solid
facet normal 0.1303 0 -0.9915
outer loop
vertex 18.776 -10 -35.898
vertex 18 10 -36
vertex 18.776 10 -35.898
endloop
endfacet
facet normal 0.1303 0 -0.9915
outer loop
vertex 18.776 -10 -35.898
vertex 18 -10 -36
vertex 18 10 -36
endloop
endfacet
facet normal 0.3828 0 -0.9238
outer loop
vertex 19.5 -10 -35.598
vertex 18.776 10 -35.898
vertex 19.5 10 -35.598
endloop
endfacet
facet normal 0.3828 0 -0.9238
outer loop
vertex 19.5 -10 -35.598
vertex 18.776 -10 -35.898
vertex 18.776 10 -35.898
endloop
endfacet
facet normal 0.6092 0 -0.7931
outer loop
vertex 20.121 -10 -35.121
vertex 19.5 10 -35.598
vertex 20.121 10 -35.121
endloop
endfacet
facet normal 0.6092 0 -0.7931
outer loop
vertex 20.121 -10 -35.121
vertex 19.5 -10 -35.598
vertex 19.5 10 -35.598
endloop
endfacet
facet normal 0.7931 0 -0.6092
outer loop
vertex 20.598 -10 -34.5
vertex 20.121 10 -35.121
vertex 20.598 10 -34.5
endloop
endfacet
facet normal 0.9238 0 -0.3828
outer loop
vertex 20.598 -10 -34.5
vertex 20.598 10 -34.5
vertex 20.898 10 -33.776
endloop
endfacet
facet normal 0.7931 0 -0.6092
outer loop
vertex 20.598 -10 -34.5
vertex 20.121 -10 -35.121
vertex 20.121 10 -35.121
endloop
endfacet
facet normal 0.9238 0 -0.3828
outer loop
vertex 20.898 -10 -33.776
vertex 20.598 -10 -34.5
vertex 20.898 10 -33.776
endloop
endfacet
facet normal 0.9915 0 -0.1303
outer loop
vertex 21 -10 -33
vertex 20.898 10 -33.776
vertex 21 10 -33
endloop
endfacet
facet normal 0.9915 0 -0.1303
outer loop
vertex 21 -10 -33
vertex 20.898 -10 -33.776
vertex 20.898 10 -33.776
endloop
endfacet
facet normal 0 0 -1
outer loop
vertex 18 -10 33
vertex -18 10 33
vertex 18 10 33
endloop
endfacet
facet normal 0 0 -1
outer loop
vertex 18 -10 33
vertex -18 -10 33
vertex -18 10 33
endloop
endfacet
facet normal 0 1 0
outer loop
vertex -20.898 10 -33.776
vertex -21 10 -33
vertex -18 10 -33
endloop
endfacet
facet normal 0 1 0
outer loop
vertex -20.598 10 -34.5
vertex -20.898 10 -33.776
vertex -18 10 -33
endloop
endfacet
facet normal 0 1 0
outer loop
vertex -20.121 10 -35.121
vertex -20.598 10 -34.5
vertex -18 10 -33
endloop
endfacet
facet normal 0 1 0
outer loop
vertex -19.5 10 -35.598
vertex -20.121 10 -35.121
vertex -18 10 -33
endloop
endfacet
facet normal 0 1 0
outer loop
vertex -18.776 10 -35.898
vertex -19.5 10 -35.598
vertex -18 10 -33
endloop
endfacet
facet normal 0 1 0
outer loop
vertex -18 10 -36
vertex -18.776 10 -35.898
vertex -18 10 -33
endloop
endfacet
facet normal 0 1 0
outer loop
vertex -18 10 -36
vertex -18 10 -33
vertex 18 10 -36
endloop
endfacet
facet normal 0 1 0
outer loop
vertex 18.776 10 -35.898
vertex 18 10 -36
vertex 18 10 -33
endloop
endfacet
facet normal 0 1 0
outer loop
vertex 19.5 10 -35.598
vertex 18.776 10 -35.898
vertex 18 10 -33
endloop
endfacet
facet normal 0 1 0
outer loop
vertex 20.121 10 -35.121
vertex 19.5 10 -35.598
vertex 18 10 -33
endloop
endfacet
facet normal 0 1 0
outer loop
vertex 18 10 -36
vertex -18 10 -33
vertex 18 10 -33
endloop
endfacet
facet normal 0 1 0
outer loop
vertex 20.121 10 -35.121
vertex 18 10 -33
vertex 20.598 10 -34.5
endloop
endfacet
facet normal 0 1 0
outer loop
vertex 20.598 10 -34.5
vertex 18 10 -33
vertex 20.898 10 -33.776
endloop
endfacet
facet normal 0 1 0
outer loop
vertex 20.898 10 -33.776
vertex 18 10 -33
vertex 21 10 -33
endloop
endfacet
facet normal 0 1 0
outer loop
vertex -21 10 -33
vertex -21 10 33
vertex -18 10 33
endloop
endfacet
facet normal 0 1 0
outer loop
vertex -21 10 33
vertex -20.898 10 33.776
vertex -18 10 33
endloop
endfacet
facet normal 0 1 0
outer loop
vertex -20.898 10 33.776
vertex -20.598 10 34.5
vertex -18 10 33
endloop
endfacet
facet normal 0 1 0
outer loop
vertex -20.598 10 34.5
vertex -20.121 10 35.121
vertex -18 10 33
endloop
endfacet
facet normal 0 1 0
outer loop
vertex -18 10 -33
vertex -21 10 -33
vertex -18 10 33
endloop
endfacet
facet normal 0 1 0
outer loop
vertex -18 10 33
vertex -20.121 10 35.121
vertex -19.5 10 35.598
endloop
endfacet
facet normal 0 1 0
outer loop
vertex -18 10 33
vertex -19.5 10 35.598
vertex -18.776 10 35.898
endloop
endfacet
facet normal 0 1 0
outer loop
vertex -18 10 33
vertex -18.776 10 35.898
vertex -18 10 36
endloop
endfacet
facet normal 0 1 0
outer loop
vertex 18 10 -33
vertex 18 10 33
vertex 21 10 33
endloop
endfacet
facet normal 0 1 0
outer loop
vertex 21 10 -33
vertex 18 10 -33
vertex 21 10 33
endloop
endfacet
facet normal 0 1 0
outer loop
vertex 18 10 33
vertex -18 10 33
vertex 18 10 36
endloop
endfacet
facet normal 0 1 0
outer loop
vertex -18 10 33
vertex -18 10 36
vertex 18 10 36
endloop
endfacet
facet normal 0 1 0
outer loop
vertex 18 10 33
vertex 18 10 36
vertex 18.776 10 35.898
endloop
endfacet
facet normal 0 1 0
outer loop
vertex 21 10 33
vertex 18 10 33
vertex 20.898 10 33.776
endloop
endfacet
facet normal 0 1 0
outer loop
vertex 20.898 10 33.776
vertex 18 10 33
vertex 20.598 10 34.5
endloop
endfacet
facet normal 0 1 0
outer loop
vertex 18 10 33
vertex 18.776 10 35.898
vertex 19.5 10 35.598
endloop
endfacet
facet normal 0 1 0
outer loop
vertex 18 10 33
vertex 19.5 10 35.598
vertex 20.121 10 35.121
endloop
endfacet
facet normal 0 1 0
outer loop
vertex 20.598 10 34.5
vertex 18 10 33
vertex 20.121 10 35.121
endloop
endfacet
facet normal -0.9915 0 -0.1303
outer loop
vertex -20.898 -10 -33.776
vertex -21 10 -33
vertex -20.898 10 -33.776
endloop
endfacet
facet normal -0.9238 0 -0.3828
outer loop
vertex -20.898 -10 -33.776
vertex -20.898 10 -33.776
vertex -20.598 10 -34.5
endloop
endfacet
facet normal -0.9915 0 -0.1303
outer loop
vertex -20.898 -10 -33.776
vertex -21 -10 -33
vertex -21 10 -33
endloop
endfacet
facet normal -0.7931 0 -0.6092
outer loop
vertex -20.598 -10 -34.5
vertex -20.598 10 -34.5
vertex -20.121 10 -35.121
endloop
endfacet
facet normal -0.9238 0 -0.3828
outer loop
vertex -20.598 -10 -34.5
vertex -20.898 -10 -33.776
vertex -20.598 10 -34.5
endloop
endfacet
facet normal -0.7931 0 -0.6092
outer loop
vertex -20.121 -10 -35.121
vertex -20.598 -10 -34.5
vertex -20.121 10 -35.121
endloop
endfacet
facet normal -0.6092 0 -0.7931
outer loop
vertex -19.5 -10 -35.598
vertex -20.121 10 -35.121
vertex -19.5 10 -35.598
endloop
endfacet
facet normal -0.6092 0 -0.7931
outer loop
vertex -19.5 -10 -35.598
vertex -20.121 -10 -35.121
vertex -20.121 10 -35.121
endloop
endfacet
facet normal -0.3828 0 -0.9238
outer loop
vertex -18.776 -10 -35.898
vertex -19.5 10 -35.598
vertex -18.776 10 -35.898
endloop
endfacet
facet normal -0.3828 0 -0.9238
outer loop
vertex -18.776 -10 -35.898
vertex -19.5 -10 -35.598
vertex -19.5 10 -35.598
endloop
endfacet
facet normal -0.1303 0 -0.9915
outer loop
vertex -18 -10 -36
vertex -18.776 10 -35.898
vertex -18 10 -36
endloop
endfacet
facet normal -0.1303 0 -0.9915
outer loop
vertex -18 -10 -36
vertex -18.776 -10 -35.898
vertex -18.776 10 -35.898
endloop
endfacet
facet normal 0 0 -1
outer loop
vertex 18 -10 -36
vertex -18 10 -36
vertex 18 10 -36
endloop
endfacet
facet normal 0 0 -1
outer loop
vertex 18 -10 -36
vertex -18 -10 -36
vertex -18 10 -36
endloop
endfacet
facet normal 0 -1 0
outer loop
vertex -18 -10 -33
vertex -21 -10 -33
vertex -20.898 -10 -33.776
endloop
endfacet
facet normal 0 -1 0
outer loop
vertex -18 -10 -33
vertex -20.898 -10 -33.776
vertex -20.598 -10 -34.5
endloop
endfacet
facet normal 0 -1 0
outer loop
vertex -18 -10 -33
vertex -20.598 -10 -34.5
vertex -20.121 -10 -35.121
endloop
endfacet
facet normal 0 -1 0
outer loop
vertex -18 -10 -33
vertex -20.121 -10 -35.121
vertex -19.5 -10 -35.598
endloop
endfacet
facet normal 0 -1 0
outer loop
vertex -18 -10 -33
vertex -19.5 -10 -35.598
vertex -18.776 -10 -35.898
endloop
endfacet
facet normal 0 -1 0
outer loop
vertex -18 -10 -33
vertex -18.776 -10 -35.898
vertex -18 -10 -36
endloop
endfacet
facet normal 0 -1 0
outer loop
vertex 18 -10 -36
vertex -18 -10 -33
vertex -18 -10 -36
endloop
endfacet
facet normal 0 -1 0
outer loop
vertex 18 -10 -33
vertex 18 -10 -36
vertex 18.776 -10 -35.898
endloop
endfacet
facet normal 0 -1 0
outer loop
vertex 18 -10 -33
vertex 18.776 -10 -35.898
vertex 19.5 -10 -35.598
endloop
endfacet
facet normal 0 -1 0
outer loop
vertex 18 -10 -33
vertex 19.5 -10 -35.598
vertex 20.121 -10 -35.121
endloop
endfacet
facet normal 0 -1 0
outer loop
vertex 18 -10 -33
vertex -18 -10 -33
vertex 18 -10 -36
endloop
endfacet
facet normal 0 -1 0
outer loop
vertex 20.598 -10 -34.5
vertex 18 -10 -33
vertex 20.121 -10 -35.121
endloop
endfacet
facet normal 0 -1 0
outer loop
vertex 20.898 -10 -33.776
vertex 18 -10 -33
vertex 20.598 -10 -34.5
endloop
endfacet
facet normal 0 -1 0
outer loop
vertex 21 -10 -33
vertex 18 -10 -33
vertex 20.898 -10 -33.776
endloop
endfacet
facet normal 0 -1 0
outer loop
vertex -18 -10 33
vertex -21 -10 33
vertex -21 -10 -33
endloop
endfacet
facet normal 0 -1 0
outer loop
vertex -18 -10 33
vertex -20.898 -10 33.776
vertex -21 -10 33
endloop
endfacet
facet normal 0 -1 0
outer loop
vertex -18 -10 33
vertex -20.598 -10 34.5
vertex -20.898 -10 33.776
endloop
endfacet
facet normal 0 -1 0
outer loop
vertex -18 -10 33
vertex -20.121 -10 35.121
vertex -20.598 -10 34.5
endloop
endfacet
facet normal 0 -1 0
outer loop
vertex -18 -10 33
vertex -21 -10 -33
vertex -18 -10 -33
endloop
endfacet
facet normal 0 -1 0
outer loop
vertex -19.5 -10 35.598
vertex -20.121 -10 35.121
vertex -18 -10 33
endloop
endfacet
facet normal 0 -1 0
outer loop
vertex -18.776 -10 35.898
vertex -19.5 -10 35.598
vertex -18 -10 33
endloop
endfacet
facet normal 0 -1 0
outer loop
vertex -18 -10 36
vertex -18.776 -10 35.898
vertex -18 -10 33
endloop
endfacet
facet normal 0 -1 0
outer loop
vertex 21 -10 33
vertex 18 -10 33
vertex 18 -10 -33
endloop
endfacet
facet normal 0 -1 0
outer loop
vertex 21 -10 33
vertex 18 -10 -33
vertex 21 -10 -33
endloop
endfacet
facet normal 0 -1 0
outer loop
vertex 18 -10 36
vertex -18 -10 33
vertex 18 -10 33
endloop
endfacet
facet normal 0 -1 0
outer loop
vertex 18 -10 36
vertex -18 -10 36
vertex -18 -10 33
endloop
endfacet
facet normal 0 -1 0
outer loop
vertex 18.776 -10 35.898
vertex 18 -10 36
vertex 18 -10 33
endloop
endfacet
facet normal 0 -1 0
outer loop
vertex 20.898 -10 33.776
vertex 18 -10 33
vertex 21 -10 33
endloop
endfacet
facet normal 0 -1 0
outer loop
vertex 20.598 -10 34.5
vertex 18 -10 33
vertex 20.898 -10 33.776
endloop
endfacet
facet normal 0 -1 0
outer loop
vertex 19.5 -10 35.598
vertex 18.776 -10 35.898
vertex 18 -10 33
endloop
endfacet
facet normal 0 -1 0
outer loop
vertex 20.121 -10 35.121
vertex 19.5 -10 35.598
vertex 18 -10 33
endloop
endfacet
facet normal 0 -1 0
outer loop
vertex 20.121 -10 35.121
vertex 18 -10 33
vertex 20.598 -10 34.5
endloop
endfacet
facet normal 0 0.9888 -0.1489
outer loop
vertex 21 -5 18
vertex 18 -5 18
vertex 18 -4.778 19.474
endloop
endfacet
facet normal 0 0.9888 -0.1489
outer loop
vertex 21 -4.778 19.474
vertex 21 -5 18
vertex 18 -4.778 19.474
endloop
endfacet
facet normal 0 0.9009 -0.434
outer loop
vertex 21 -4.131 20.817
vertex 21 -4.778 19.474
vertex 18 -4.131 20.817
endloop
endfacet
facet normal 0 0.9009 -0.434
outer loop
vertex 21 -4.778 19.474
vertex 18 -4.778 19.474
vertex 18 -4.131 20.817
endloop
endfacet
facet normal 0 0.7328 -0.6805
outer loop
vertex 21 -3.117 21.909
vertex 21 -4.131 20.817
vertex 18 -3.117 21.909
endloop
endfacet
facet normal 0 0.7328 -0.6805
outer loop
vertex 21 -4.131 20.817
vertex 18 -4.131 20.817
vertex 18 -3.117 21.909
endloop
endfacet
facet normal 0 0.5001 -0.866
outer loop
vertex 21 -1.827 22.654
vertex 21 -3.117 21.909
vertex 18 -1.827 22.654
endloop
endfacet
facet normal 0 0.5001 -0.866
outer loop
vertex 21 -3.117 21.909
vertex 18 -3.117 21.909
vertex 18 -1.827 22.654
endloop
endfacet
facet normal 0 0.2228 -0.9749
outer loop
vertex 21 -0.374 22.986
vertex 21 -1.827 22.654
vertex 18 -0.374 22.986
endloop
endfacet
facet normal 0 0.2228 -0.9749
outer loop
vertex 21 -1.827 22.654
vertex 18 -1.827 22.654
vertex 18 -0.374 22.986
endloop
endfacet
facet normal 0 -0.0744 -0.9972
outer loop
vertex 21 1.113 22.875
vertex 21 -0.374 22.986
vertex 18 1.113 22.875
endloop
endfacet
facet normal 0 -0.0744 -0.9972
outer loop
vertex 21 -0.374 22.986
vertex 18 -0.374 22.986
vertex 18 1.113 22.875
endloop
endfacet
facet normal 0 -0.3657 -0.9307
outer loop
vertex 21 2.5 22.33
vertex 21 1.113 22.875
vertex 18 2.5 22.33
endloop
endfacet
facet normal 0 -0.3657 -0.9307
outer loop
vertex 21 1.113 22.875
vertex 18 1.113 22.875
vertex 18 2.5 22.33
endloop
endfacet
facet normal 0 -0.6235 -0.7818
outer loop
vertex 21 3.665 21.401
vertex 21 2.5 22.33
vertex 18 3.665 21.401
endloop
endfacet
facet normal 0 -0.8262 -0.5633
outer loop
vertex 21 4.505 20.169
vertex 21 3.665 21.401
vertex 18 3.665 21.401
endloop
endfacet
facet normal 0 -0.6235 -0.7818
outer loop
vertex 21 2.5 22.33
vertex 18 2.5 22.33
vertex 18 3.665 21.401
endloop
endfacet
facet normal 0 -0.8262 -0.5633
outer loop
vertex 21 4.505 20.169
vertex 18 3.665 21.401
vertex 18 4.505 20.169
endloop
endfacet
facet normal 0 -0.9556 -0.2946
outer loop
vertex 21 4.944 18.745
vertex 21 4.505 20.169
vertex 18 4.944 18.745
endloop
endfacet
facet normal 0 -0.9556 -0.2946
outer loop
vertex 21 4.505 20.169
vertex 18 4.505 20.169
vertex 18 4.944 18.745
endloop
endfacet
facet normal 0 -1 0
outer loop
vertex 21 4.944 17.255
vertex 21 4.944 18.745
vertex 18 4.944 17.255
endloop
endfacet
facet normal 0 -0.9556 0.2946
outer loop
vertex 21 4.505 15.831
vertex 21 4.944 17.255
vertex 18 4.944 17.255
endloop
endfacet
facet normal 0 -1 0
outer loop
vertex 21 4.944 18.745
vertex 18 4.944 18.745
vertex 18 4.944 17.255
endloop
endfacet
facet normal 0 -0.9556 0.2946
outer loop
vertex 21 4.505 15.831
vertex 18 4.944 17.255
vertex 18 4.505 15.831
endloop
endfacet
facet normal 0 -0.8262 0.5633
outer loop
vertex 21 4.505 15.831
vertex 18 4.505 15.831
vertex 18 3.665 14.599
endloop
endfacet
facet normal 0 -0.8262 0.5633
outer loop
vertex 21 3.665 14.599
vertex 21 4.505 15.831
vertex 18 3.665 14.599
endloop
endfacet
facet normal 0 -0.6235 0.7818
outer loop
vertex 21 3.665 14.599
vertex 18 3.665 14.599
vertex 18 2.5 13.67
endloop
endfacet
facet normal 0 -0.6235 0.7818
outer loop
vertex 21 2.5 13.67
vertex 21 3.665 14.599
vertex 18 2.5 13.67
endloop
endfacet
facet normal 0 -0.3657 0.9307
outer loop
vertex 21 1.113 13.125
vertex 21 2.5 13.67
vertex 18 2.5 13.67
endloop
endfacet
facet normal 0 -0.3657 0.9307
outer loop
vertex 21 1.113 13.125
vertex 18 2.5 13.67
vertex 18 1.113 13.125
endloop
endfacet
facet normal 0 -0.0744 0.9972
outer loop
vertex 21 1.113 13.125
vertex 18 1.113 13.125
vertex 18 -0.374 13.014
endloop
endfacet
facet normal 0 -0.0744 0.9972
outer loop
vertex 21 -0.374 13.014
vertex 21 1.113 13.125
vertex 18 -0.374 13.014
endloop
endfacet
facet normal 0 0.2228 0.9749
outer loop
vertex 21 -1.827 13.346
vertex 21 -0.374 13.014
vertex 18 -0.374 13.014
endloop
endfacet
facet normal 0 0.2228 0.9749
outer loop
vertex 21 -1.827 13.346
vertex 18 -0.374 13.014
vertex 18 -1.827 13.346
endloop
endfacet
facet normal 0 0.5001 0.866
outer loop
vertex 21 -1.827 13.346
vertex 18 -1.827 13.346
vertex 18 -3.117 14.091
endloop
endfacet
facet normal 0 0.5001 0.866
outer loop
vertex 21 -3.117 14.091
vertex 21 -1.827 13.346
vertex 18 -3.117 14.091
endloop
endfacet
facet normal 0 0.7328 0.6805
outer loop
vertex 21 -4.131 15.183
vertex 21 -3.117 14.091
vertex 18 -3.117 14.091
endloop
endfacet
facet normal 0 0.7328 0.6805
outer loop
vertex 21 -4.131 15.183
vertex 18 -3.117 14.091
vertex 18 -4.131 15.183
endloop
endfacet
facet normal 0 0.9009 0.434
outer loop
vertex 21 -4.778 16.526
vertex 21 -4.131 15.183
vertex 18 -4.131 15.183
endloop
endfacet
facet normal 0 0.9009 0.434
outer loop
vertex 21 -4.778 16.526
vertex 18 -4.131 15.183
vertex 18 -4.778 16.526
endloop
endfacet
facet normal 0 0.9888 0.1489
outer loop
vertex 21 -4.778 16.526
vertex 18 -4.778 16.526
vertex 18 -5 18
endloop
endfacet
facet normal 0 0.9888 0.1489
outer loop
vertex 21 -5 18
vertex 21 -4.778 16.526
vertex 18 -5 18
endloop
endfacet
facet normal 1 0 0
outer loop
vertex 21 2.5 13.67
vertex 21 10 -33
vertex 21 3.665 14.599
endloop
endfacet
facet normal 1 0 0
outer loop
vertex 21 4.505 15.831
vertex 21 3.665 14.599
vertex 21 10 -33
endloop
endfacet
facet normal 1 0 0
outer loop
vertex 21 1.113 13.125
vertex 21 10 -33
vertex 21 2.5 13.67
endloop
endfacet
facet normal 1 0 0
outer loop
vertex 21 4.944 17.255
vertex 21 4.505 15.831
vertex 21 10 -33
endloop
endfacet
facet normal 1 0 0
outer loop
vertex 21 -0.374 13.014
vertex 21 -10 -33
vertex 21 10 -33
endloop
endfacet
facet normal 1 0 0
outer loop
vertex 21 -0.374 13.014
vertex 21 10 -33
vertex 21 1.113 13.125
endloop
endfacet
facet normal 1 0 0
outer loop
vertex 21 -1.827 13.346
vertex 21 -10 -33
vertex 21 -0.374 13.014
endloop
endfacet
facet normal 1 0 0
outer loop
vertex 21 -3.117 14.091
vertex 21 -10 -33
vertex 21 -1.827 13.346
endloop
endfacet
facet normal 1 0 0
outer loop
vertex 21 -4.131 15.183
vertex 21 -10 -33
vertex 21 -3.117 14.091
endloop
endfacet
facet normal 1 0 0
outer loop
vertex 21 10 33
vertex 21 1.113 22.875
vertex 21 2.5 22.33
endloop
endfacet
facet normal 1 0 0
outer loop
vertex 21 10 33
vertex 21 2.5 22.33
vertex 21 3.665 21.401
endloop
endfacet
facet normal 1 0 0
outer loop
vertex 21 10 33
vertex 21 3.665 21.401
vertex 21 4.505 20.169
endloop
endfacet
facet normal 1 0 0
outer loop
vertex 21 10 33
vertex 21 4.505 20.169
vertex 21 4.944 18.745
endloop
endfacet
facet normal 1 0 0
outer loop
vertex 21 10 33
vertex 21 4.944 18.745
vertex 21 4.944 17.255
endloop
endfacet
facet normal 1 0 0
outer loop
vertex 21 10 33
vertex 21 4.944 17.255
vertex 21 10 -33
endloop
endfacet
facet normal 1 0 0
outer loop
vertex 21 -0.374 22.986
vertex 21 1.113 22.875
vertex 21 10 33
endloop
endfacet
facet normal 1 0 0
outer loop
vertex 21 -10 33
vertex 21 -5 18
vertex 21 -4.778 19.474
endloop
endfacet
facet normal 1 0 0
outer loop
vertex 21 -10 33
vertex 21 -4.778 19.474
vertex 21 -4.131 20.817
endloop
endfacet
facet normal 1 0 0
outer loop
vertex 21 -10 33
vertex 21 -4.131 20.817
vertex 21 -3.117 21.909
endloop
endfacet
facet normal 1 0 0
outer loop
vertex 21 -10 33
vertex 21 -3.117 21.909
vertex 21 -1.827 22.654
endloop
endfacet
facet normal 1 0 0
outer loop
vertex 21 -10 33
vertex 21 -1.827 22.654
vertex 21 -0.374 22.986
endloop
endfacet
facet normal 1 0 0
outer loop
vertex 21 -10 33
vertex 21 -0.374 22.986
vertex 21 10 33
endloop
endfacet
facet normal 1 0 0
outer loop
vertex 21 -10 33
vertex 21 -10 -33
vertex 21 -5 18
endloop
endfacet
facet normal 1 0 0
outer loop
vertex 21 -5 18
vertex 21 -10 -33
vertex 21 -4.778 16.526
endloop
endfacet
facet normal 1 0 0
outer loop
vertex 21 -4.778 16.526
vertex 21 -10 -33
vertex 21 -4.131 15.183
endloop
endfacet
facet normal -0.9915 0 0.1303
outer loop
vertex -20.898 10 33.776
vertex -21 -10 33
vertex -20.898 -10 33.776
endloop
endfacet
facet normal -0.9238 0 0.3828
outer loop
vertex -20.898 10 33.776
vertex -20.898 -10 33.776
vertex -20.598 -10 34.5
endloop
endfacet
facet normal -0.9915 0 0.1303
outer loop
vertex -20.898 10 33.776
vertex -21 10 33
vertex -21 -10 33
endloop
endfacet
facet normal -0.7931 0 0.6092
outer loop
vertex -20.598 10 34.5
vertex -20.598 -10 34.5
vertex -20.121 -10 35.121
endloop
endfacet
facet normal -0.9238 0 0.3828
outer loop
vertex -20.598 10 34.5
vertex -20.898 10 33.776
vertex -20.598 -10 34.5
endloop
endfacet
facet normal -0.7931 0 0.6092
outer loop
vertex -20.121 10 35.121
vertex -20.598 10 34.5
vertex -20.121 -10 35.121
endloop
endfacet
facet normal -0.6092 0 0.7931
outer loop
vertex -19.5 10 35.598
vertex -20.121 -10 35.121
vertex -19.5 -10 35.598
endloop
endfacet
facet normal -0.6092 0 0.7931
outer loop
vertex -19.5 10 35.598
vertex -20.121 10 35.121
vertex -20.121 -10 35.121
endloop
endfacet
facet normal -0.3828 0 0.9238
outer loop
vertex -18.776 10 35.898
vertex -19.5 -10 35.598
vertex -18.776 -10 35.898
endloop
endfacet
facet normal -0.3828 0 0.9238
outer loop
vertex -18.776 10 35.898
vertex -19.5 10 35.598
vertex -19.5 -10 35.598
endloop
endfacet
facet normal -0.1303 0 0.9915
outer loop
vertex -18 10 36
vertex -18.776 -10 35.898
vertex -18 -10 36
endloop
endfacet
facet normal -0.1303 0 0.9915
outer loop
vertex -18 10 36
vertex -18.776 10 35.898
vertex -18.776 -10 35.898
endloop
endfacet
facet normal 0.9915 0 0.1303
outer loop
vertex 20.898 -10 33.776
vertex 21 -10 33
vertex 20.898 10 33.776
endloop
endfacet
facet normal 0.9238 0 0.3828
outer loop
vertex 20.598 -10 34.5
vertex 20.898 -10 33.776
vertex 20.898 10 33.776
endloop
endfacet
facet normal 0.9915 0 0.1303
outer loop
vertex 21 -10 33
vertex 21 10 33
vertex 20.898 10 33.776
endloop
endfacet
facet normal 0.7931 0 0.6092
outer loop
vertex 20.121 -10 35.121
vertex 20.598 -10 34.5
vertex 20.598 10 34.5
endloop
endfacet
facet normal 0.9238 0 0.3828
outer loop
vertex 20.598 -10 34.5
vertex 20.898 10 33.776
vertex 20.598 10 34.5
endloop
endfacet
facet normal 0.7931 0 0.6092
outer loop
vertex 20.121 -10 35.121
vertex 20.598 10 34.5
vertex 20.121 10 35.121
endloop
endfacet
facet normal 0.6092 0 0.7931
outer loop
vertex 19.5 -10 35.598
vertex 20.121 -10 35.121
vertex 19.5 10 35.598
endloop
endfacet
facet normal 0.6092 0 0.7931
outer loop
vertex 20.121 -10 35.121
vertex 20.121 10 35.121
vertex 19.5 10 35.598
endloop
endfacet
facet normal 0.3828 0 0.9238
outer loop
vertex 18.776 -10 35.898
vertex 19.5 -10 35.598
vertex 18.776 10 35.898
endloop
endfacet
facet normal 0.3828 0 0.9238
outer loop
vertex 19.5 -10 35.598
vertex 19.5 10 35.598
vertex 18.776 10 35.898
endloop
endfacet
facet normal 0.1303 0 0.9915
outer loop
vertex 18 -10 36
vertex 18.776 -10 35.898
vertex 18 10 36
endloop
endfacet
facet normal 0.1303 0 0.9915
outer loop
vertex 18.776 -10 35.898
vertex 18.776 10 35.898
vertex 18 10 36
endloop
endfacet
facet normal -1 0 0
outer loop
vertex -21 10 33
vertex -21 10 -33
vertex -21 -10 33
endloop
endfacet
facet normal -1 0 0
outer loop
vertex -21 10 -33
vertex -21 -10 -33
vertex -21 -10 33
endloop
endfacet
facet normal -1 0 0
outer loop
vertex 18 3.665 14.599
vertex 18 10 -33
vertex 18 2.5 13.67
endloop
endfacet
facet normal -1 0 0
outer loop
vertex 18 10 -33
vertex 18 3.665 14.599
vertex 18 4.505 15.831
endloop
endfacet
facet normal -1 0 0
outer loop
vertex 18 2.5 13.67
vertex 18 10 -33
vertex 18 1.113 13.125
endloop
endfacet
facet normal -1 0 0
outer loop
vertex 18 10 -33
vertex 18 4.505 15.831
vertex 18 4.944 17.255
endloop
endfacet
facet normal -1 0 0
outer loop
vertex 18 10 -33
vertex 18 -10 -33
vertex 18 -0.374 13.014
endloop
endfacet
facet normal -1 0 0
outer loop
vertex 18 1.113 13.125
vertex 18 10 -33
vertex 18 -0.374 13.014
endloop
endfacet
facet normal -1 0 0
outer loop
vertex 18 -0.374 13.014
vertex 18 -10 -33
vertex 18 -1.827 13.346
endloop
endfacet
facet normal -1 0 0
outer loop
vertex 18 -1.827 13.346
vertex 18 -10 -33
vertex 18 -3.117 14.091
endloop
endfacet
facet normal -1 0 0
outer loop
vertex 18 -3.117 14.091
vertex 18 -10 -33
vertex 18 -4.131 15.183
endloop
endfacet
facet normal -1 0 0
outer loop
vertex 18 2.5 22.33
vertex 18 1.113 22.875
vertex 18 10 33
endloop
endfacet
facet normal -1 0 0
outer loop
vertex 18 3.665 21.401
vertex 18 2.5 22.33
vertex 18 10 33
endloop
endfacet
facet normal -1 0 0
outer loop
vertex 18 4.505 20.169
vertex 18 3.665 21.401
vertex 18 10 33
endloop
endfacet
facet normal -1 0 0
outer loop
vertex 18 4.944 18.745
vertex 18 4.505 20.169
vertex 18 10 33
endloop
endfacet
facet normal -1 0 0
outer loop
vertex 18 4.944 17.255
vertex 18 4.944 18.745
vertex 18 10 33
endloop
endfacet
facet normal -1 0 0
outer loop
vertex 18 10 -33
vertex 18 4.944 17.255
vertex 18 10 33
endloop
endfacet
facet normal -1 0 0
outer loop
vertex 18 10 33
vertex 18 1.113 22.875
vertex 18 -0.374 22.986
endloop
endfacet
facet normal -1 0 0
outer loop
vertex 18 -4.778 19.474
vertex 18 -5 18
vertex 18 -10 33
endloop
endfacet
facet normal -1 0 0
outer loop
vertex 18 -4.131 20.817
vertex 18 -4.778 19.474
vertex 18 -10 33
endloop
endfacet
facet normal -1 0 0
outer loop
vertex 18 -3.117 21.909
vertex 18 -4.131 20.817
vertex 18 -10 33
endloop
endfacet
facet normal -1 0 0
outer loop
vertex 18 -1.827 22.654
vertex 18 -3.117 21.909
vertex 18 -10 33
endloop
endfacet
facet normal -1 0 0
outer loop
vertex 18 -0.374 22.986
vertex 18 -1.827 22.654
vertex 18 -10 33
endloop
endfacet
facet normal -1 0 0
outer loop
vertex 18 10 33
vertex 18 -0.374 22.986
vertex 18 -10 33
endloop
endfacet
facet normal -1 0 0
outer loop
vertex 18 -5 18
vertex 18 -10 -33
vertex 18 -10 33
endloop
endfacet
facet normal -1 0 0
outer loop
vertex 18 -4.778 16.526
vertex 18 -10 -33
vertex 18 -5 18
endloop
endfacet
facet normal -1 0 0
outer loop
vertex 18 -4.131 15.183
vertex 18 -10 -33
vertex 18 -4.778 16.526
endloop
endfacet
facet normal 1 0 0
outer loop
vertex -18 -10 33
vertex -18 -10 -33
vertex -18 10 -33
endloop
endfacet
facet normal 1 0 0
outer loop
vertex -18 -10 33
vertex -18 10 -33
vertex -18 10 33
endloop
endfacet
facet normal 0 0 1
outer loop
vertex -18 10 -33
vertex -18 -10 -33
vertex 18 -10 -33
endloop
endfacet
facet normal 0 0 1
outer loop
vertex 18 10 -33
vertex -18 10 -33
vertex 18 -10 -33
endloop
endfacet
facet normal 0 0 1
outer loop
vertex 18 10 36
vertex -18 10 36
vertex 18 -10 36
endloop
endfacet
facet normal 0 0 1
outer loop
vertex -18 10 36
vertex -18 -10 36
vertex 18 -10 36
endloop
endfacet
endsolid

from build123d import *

# Parameters (mm, degrees)
F0_W     = 42
F0_H     = 72
F0_W_2   = 36
F0_H_2   = 66
F1_DEPTH = 10
F2_R     = 3
F3_R     = 3
F5_D     = 10
F5_DEPTH = 3


with BuildPart() as f1:
    # F0 (on Front) → F1 (new body, symmetric)
    with BuildSketch(Plane.XZ):
        Rectangle(F0_W, F0_H)
        Rectangle(F0_W_2, F0_H_2, mode=Mode.SUBTRACT)
    extrude(amount=F1_DEPTH, both=True)

    # F2
    f2_edges = [f1.edges().sort_by_distance(p)[0] for p in [
        (21, 0, 36),
        (-21, 0, 36),
    ]]
    fillet(f2_edges, radius=F2_R)

    # F3
    f3_edges = [f1.edges().sort_by_distance(p)[0] for p in [
        (21, 0, -36),
        (-21, 0, -36),
    ]]
    fillet(f3_edges, radius=F3_R)

    # F5
    with Locations(Plane.YZ.offset(21)):
        with Locations((0, 18)):
            Hole(F5_D / 2, depth=F5_DEPTH)


solid = f1.part
